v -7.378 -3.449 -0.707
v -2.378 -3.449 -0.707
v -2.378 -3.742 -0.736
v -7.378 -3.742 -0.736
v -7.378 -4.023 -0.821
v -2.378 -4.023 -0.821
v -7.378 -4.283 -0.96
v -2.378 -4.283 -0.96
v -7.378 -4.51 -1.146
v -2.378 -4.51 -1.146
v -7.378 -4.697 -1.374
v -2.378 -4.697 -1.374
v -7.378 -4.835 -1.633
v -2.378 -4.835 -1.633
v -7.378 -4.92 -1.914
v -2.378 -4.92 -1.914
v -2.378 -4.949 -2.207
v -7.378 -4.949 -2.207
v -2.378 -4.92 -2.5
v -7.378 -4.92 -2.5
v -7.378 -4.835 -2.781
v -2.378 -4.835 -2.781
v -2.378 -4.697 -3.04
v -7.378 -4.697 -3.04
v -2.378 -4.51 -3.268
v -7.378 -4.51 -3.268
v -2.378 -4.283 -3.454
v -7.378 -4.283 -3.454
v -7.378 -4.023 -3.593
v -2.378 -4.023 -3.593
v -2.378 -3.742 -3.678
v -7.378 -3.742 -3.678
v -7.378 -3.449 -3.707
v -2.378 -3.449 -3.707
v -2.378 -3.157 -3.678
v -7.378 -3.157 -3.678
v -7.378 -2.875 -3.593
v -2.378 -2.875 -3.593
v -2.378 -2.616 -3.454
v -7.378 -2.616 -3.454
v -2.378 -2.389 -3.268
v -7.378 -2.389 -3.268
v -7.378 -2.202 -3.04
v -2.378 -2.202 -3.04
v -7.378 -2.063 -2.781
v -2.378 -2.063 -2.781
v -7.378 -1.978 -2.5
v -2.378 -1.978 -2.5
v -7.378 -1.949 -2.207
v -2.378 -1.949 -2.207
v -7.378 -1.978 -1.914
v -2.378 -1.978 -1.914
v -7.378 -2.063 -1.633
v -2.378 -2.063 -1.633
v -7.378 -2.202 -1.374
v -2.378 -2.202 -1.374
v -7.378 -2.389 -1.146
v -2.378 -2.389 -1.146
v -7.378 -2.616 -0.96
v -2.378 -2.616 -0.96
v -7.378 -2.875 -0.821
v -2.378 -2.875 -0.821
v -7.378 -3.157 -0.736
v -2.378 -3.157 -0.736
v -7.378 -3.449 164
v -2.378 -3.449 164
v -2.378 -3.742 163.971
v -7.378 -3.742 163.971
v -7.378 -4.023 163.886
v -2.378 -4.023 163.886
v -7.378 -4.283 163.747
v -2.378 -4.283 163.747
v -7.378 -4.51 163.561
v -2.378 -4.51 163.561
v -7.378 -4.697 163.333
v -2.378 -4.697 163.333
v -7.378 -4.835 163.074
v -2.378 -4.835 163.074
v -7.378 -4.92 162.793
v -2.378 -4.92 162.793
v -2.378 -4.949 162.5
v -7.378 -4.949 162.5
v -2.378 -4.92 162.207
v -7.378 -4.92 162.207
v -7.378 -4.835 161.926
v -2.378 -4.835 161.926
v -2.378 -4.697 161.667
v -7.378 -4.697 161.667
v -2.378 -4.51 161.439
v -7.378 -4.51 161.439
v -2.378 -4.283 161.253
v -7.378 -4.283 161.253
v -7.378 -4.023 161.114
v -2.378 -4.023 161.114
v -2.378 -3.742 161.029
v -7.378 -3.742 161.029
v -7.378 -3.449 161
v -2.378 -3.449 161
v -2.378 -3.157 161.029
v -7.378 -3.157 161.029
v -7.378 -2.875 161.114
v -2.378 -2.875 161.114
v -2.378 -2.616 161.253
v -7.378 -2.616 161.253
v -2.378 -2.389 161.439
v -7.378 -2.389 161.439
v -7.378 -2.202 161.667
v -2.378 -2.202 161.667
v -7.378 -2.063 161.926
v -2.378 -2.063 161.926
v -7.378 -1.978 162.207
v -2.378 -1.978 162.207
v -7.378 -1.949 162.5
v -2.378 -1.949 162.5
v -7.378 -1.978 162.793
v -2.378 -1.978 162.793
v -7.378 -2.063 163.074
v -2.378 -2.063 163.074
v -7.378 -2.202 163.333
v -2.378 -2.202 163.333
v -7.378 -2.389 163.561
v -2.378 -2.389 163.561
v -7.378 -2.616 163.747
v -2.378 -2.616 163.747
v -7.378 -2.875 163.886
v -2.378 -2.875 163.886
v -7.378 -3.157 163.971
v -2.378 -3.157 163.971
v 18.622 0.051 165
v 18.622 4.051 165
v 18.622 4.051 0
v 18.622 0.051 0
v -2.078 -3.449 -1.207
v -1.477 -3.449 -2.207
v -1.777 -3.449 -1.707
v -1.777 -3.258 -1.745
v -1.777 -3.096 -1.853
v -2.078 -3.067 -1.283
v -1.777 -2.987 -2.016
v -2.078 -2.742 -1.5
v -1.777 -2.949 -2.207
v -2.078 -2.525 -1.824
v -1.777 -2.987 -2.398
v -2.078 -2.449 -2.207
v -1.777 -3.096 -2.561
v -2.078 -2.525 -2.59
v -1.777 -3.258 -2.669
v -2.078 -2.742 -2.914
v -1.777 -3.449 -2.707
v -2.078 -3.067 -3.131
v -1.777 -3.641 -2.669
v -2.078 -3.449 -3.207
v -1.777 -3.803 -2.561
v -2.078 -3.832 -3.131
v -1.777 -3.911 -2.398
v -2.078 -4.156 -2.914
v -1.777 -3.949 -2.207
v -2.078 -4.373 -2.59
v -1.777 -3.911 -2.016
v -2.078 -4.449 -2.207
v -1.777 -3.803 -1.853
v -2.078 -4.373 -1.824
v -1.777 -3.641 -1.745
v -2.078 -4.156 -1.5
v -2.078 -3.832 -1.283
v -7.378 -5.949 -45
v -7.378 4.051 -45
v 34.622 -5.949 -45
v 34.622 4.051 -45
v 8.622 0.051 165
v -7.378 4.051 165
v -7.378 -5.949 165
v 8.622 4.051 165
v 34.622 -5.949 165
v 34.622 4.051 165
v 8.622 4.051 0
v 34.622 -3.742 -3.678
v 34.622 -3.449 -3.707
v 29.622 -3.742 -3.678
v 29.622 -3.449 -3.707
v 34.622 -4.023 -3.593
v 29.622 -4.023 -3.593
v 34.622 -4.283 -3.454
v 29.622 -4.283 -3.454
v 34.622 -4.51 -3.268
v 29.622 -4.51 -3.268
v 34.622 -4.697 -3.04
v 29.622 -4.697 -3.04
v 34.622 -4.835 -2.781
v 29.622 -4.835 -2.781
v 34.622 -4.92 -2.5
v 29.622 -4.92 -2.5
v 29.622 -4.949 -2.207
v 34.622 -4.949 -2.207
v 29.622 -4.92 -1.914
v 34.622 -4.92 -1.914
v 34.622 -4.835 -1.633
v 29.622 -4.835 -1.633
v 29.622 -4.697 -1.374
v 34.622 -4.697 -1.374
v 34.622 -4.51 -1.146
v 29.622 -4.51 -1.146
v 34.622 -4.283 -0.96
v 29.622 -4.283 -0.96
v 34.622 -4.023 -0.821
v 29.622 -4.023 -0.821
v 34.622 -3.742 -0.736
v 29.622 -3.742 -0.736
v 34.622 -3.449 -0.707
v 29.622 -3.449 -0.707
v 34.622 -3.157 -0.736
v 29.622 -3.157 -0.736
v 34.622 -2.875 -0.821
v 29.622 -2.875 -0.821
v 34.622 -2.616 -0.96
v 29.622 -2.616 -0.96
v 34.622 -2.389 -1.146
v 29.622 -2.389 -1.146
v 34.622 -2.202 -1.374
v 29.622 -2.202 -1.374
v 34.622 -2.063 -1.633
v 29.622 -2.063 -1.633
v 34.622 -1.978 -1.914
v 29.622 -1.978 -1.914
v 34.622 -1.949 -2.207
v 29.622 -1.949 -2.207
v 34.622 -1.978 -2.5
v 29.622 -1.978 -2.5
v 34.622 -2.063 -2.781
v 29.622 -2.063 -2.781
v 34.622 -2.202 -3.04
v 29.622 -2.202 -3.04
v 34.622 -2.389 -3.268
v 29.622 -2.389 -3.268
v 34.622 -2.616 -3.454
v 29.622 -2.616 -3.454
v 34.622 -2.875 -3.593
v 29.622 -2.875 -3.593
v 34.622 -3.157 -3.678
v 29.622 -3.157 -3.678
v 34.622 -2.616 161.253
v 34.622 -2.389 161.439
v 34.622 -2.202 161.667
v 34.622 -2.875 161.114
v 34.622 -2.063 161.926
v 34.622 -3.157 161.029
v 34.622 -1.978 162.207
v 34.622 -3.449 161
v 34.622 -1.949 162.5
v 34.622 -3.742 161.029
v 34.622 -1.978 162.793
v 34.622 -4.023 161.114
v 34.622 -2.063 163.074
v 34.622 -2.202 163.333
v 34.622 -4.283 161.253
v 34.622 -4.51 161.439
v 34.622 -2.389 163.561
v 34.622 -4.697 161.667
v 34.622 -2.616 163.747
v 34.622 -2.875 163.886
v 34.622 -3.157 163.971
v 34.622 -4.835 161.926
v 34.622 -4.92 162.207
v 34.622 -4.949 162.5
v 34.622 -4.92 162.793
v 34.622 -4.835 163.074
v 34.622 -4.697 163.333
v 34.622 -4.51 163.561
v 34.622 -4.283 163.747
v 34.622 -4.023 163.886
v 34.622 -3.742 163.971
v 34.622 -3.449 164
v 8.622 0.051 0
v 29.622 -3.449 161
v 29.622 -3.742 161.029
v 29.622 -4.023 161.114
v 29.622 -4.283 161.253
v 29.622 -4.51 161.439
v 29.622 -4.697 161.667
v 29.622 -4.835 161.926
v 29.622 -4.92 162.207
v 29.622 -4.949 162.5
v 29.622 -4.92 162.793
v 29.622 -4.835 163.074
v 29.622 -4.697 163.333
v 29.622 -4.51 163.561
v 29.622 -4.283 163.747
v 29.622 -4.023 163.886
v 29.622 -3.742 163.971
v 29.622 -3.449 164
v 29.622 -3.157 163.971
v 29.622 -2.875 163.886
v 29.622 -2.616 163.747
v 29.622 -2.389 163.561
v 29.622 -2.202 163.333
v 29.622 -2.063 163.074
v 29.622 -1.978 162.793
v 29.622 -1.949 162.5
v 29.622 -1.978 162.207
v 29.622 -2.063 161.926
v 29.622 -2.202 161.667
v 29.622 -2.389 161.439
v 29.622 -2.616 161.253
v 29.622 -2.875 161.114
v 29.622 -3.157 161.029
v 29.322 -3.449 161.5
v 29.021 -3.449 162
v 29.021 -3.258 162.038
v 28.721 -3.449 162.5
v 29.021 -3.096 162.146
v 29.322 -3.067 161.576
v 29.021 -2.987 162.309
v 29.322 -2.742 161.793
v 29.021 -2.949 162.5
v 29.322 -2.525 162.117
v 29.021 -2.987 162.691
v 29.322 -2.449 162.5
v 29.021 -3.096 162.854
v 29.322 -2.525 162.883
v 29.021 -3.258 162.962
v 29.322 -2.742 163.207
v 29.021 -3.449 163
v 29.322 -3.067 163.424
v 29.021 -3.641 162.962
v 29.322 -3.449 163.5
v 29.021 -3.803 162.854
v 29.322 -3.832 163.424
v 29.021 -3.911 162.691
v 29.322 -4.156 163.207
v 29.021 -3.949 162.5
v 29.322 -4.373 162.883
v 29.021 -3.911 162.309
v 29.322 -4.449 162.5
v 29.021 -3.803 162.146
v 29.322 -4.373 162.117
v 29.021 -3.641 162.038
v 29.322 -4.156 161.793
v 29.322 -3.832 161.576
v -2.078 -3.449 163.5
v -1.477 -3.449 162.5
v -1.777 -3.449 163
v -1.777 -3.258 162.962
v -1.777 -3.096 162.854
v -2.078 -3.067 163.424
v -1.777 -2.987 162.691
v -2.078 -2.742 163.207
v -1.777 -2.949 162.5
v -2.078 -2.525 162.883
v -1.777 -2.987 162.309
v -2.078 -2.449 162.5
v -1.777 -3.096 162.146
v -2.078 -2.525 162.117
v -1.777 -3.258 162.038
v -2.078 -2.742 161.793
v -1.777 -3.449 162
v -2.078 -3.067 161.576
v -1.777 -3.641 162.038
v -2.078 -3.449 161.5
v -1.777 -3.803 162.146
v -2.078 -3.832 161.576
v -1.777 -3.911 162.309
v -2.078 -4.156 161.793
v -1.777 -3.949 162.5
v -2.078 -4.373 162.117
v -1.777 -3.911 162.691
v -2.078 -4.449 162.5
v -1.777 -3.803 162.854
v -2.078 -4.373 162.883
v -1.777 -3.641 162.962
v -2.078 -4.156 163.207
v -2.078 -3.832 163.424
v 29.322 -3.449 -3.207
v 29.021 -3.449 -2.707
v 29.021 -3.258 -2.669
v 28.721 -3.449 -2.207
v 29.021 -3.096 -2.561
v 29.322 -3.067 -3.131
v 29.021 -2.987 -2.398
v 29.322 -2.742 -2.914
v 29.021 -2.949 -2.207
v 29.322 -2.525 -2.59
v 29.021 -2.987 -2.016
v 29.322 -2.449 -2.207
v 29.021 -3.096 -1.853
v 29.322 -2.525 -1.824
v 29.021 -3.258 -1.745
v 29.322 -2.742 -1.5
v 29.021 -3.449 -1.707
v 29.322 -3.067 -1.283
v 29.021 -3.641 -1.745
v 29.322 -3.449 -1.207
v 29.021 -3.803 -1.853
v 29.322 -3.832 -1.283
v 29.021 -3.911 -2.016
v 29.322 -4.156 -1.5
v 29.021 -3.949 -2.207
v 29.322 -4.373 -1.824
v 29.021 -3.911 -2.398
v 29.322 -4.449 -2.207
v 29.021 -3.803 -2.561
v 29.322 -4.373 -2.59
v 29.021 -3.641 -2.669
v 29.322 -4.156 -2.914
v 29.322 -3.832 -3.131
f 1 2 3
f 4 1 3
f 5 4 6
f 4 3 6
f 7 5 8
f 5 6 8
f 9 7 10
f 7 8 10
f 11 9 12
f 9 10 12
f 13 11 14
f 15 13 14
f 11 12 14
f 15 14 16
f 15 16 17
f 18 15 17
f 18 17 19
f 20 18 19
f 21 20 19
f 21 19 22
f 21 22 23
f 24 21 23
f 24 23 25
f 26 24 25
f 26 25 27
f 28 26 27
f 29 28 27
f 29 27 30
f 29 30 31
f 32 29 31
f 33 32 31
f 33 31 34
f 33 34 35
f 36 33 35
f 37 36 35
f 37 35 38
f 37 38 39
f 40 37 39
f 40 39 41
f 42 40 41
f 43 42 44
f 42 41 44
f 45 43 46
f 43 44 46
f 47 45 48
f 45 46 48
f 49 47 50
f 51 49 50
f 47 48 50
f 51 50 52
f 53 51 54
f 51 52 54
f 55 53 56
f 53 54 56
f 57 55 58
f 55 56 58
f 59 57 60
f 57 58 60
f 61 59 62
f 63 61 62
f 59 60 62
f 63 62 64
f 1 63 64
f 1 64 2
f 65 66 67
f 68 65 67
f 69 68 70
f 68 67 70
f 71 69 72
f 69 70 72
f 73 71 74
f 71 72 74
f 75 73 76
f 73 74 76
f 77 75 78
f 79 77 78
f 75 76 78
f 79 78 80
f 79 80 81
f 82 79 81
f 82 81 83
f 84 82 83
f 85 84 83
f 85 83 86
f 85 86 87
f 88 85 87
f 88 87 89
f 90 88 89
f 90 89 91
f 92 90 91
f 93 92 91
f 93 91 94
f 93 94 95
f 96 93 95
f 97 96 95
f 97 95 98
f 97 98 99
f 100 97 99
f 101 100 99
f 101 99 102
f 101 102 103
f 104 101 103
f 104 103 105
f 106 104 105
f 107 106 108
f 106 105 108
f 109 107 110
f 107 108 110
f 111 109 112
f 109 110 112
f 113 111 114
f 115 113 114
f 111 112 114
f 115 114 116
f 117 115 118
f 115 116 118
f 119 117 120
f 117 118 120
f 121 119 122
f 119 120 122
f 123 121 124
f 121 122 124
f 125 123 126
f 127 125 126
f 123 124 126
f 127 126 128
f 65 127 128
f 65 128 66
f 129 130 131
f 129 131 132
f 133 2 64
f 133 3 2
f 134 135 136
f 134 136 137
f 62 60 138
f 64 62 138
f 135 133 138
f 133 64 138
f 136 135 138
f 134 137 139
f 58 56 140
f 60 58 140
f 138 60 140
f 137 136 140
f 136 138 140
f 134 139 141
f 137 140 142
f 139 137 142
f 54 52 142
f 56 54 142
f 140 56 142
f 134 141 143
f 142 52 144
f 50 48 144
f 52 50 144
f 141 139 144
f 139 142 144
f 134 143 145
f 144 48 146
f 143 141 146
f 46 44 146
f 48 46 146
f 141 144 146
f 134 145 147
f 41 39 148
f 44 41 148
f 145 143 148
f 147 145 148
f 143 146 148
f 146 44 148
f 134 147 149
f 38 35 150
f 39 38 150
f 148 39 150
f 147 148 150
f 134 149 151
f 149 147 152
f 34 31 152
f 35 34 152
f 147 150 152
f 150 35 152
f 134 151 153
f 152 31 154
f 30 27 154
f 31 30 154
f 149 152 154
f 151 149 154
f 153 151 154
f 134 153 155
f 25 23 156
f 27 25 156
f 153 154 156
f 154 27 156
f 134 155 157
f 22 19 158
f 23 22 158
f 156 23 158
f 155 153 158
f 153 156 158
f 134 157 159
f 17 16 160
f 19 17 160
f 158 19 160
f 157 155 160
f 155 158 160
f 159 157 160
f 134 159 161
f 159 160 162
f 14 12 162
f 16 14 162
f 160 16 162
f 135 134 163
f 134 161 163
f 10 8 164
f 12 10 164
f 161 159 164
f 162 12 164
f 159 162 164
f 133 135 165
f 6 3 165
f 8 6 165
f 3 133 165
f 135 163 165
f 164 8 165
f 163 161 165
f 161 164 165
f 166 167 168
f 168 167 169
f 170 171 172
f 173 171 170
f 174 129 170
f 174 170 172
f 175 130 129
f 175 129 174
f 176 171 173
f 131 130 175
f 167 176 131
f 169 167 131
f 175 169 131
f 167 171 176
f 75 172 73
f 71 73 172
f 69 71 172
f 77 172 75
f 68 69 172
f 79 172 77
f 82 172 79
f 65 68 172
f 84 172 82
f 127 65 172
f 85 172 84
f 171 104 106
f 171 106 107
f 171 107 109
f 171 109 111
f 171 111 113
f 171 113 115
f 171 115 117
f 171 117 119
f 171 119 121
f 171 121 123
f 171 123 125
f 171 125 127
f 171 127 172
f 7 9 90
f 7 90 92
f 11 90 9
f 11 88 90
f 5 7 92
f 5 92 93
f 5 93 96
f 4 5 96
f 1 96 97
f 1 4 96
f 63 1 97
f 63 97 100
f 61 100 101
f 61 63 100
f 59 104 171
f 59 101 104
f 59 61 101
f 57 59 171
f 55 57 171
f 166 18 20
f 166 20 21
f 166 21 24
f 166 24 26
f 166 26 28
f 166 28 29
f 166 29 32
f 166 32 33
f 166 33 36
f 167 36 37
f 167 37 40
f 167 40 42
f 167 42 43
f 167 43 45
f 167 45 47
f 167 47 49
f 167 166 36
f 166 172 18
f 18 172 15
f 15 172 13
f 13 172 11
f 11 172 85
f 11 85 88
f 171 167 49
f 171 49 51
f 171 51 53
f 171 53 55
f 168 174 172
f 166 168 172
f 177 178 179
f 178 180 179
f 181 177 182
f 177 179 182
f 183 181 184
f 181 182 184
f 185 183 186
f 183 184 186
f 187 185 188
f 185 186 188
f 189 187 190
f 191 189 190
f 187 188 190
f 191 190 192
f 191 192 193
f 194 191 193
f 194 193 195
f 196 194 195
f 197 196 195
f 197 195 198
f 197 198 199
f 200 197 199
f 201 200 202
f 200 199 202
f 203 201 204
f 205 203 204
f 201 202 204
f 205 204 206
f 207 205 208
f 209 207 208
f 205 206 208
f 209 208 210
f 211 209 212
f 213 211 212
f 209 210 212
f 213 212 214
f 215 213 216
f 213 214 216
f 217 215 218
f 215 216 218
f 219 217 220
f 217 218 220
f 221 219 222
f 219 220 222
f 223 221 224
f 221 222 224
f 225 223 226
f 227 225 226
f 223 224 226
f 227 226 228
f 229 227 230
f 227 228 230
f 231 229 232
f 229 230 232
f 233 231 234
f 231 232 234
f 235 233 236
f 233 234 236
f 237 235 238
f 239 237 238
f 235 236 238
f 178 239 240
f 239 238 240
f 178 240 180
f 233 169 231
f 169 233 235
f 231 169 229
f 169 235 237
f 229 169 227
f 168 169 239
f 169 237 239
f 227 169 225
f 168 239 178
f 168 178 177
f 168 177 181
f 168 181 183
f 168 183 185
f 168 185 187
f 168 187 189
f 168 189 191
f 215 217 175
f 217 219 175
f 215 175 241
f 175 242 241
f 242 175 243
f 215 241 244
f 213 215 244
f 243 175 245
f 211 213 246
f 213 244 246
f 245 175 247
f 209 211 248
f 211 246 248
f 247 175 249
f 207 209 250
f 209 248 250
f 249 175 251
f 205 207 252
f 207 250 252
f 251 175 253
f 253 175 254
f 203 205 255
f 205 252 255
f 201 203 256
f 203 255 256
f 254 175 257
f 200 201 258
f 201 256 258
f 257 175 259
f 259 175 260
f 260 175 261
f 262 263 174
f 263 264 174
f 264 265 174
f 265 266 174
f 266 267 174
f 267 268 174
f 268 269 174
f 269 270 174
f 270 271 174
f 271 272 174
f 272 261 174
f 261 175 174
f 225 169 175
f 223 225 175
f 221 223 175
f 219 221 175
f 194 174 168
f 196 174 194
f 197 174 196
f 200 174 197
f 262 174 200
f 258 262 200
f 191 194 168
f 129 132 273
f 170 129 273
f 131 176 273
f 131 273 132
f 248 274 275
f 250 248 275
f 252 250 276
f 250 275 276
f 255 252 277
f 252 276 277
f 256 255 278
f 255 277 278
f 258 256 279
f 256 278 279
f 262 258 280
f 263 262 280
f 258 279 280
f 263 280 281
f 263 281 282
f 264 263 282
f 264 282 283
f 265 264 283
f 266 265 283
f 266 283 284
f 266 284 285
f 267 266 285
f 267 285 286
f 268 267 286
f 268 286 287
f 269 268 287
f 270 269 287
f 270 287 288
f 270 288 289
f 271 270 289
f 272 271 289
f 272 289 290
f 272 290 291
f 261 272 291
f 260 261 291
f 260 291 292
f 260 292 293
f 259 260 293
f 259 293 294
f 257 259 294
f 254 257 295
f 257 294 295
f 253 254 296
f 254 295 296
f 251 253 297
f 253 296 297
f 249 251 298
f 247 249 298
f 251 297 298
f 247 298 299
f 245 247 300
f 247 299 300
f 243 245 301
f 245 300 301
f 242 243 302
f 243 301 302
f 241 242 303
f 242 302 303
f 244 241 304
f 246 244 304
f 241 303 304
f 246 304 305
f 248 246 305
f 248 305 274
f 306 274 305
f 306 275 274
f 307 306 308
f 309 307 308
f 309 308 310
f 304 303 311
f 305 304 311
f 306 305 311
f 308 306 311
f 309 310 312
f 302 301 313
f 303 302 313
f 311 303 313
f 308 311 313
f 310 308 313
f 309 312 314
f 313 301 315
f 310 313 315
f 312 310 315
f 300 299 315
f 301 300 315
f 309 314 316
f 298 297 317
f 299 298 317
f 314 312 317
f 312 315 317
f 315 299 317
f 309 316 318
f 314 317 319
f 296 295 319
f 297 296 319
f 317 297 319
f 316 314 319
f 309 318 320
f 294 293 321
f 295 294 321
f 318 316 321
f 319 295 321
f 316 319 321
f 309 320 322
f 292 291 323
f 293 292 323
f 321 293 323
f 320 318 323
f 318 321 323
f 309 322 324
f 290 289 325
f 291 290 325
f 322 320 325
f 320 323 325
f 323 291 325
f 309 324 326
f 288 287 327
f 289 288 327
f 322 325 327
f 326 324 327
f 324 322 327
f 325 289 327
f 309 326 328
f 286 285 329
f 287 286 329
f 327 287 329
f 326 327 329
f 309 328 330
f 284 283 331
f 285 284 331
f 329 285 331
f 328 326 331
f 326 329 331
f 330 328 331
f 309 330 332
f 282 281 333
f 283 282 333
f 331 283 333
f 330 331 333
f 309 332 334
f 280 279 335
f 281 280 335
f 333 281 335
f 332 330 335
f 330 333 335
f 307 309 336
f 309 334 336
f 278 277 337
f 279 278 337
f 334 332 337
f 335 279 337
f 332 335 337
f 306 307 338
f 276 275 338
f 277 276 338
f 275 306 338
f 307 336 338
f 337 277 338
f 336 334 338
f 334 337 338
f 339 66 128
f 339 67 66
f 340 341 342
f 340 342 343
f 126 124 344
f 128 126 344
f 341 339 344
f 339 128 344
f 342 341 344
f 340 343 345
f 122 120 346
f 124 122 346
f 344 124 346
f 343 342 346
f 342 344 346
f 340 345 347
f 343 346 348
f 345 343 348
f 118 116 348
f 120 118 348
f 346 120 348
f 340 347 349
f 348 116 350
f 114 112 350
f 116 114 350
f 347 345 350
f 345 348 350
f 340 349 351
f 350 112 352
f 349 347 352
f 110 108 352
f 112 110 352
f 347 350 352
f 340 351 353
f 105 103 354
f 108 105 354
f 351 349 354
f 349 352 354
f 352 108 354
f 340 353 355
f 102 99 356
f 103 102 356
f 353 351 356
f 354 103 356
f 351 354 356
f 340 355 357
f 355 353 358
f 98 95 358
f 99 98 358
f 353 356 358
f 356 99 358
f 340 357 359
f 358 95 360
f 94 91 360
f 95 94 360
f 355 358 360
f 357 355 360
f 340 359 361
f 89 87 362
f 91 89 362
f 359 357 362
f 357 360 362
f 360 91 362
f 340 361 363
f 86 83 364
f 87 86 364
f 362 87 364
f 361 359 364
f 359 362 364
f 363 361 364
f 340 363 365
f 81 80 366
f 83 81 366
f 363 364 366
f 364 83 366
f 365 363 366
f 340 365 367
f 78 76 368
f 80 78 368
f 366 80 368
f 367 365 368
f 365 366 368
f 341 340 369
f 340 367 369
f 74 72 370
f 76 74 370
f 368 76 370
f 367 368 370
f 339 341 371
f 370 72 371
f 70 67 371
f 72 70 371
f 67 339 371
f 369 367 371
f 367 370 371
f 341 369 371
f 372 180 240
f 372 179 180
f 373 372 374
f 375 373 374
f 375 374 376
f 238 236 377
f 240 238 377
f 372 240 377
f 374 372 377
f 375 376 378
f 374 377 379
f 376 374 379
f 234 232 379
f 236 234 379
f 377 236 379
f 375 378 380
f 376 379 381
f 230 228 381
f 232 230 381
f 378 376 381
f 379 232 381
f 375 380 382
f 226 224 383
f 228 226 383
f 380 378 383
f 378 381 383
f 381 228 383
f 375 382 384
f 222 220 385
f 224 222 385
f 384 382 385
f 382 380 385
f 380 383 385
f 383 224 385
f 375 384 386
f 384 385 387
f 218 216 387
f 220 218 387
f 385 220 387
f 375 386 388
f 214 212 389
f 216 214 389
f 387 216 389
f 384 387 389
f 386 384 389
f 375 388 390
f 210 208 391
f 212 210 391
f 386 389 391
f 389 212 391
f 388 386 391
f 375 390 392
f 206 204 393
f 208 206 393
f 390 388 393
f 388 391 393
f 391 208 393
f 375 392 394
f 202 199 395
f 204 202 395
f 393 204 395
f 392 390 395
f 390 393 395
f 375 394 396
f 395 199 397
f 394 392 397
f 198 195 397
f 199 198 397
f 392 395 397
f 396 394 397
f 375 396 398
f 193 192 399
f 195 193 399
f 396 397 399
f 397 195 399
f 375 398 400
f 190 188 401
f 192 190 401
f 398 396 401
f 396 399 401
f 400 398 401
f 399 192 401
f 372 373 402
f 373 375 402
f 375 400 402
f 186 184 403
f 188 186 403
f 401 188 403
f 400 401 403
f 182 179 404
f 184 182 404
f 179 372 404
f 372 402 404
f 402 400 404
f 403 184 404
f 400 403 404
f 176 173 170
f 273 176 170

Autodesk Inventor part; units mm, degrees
ref_plane "YZ Plane" through (0, 0, 0) normal (1, 0, 0) x (0, 1, 0)
ref_plane "XZ Plane" through (0, 0, 0) normal (0, 1, 0) x (-1, 0, 0)
ref_plane "XY Plane" through (0, 0, 0) normal (0, 0, 1) x (1, 0, 0)
sketch "Sketch1" plane through (0, 0, 0) normal (0, 0, 1) x (1, 0, 0)
  line L0 (-7.378, 4.0507) -> (34.622, 4.0507)
  line L1 (34.622, 4.0507) -> (34.622, -5.9493)
  line L2 (34.622, -5.9493) -> (-7.378, -5.9493)
  line L3 (-7.378, -5.9493) -> (-7.378, 4.0507)
  line L4 (8.622, 4.0507) -> (8.622, 0.0507)
  line L5 (18.622, 4.0507) -> (18.622, 0.0507)
  line L6 (18.622, 0.0507) -> (8.622, 0.0507)
  point P0 (0, 0)
extrude "Extrusion1" add sketch "Sketch1" against normal blind 45
extrude "Extrusion2" add sketch "Sketch1" along normal blind 165 contours L0 L4 L6 L5 L1 L2 L3
sketch "Sketch2" plane through (34.622, -5.9493, -45) normal (1, 0, 0) x (0, 0, -1)
  line L0 (0, 0) -> (0, 10) projected
  line L1 (0, 0) -> (-210, 0) projected
  line L2 (-210, 10) -> (0, 10) projected
  circle A0 centre (-42.793, 2.5) radius 1.5
  point P0 (-45, 5.9493)
hole "Hole1" at (34.622, -3.4493, -2.207) direction (-1, 0, 0) diameter 3 depth 5 tip angle 118
sketch "Sketch3" plane through (34.622, -5.9493, -45) normal (1, 0, 0) x (0, 0, -1)
  line L0 (0, 0) -> (-210, 0) projected
  line L1 (-210, 0) -> (-207.5, 0)
  line L2 (-207.5, 0) -> (-207.5, 2.5)
  circle A0 centre (-207.5, 2.5) radius 1.5
  point P0 (-45, 5.9493)
  dimension "d19" = 2.5
  dimension "d20" = 2.5
  dimension "d21" = 3
hole "Hole2" at (34.622, -3.4493, 162.5) direction (-1, 0, 0) diameter 3 depth 5 tip angle 118
sketch "Sketch4" plane through (-7.378, -5.9493, -45) normal (-1, 0, 0) x (0, 0, 1)
  circle A0 centre (207.5, 2.5) radius 1.5 projected
  circle A1 centre (207.5, 2.5) radius 1.5
  circle A2 centre (42.793, 2.5) radius 1.5 projected
  circle A3 centre (42.793, 2.5) radius 1.5
  point P0 (45, 5.9493)
hole "Hole3" at (-7.378, -3.4493, 162.5) direction (1, 0, 0) diameter 3 depth 5 tip angle 118
hole "Hole4" at (-7.378, -3.4493, -2.207) direction (1, 0, 0) diameter 3 depth 5 tip angle 118
thread "Thread1" size "M3x0.5" class "6H" standard "ANSI Metric M Profile" full length
thread "Thread2" size "M3x0.5" class "6H" standard "ANSI Metric M Profile" full length
thread "Thread3" size "M3x0.5" class "6H" standard "ANSI Metric M Profile" full length
thread "Thread4" size "M3x0.5" class "6H" standard "ANSI Metric M Profile" full length
properties part number "sina" material "Lead"
